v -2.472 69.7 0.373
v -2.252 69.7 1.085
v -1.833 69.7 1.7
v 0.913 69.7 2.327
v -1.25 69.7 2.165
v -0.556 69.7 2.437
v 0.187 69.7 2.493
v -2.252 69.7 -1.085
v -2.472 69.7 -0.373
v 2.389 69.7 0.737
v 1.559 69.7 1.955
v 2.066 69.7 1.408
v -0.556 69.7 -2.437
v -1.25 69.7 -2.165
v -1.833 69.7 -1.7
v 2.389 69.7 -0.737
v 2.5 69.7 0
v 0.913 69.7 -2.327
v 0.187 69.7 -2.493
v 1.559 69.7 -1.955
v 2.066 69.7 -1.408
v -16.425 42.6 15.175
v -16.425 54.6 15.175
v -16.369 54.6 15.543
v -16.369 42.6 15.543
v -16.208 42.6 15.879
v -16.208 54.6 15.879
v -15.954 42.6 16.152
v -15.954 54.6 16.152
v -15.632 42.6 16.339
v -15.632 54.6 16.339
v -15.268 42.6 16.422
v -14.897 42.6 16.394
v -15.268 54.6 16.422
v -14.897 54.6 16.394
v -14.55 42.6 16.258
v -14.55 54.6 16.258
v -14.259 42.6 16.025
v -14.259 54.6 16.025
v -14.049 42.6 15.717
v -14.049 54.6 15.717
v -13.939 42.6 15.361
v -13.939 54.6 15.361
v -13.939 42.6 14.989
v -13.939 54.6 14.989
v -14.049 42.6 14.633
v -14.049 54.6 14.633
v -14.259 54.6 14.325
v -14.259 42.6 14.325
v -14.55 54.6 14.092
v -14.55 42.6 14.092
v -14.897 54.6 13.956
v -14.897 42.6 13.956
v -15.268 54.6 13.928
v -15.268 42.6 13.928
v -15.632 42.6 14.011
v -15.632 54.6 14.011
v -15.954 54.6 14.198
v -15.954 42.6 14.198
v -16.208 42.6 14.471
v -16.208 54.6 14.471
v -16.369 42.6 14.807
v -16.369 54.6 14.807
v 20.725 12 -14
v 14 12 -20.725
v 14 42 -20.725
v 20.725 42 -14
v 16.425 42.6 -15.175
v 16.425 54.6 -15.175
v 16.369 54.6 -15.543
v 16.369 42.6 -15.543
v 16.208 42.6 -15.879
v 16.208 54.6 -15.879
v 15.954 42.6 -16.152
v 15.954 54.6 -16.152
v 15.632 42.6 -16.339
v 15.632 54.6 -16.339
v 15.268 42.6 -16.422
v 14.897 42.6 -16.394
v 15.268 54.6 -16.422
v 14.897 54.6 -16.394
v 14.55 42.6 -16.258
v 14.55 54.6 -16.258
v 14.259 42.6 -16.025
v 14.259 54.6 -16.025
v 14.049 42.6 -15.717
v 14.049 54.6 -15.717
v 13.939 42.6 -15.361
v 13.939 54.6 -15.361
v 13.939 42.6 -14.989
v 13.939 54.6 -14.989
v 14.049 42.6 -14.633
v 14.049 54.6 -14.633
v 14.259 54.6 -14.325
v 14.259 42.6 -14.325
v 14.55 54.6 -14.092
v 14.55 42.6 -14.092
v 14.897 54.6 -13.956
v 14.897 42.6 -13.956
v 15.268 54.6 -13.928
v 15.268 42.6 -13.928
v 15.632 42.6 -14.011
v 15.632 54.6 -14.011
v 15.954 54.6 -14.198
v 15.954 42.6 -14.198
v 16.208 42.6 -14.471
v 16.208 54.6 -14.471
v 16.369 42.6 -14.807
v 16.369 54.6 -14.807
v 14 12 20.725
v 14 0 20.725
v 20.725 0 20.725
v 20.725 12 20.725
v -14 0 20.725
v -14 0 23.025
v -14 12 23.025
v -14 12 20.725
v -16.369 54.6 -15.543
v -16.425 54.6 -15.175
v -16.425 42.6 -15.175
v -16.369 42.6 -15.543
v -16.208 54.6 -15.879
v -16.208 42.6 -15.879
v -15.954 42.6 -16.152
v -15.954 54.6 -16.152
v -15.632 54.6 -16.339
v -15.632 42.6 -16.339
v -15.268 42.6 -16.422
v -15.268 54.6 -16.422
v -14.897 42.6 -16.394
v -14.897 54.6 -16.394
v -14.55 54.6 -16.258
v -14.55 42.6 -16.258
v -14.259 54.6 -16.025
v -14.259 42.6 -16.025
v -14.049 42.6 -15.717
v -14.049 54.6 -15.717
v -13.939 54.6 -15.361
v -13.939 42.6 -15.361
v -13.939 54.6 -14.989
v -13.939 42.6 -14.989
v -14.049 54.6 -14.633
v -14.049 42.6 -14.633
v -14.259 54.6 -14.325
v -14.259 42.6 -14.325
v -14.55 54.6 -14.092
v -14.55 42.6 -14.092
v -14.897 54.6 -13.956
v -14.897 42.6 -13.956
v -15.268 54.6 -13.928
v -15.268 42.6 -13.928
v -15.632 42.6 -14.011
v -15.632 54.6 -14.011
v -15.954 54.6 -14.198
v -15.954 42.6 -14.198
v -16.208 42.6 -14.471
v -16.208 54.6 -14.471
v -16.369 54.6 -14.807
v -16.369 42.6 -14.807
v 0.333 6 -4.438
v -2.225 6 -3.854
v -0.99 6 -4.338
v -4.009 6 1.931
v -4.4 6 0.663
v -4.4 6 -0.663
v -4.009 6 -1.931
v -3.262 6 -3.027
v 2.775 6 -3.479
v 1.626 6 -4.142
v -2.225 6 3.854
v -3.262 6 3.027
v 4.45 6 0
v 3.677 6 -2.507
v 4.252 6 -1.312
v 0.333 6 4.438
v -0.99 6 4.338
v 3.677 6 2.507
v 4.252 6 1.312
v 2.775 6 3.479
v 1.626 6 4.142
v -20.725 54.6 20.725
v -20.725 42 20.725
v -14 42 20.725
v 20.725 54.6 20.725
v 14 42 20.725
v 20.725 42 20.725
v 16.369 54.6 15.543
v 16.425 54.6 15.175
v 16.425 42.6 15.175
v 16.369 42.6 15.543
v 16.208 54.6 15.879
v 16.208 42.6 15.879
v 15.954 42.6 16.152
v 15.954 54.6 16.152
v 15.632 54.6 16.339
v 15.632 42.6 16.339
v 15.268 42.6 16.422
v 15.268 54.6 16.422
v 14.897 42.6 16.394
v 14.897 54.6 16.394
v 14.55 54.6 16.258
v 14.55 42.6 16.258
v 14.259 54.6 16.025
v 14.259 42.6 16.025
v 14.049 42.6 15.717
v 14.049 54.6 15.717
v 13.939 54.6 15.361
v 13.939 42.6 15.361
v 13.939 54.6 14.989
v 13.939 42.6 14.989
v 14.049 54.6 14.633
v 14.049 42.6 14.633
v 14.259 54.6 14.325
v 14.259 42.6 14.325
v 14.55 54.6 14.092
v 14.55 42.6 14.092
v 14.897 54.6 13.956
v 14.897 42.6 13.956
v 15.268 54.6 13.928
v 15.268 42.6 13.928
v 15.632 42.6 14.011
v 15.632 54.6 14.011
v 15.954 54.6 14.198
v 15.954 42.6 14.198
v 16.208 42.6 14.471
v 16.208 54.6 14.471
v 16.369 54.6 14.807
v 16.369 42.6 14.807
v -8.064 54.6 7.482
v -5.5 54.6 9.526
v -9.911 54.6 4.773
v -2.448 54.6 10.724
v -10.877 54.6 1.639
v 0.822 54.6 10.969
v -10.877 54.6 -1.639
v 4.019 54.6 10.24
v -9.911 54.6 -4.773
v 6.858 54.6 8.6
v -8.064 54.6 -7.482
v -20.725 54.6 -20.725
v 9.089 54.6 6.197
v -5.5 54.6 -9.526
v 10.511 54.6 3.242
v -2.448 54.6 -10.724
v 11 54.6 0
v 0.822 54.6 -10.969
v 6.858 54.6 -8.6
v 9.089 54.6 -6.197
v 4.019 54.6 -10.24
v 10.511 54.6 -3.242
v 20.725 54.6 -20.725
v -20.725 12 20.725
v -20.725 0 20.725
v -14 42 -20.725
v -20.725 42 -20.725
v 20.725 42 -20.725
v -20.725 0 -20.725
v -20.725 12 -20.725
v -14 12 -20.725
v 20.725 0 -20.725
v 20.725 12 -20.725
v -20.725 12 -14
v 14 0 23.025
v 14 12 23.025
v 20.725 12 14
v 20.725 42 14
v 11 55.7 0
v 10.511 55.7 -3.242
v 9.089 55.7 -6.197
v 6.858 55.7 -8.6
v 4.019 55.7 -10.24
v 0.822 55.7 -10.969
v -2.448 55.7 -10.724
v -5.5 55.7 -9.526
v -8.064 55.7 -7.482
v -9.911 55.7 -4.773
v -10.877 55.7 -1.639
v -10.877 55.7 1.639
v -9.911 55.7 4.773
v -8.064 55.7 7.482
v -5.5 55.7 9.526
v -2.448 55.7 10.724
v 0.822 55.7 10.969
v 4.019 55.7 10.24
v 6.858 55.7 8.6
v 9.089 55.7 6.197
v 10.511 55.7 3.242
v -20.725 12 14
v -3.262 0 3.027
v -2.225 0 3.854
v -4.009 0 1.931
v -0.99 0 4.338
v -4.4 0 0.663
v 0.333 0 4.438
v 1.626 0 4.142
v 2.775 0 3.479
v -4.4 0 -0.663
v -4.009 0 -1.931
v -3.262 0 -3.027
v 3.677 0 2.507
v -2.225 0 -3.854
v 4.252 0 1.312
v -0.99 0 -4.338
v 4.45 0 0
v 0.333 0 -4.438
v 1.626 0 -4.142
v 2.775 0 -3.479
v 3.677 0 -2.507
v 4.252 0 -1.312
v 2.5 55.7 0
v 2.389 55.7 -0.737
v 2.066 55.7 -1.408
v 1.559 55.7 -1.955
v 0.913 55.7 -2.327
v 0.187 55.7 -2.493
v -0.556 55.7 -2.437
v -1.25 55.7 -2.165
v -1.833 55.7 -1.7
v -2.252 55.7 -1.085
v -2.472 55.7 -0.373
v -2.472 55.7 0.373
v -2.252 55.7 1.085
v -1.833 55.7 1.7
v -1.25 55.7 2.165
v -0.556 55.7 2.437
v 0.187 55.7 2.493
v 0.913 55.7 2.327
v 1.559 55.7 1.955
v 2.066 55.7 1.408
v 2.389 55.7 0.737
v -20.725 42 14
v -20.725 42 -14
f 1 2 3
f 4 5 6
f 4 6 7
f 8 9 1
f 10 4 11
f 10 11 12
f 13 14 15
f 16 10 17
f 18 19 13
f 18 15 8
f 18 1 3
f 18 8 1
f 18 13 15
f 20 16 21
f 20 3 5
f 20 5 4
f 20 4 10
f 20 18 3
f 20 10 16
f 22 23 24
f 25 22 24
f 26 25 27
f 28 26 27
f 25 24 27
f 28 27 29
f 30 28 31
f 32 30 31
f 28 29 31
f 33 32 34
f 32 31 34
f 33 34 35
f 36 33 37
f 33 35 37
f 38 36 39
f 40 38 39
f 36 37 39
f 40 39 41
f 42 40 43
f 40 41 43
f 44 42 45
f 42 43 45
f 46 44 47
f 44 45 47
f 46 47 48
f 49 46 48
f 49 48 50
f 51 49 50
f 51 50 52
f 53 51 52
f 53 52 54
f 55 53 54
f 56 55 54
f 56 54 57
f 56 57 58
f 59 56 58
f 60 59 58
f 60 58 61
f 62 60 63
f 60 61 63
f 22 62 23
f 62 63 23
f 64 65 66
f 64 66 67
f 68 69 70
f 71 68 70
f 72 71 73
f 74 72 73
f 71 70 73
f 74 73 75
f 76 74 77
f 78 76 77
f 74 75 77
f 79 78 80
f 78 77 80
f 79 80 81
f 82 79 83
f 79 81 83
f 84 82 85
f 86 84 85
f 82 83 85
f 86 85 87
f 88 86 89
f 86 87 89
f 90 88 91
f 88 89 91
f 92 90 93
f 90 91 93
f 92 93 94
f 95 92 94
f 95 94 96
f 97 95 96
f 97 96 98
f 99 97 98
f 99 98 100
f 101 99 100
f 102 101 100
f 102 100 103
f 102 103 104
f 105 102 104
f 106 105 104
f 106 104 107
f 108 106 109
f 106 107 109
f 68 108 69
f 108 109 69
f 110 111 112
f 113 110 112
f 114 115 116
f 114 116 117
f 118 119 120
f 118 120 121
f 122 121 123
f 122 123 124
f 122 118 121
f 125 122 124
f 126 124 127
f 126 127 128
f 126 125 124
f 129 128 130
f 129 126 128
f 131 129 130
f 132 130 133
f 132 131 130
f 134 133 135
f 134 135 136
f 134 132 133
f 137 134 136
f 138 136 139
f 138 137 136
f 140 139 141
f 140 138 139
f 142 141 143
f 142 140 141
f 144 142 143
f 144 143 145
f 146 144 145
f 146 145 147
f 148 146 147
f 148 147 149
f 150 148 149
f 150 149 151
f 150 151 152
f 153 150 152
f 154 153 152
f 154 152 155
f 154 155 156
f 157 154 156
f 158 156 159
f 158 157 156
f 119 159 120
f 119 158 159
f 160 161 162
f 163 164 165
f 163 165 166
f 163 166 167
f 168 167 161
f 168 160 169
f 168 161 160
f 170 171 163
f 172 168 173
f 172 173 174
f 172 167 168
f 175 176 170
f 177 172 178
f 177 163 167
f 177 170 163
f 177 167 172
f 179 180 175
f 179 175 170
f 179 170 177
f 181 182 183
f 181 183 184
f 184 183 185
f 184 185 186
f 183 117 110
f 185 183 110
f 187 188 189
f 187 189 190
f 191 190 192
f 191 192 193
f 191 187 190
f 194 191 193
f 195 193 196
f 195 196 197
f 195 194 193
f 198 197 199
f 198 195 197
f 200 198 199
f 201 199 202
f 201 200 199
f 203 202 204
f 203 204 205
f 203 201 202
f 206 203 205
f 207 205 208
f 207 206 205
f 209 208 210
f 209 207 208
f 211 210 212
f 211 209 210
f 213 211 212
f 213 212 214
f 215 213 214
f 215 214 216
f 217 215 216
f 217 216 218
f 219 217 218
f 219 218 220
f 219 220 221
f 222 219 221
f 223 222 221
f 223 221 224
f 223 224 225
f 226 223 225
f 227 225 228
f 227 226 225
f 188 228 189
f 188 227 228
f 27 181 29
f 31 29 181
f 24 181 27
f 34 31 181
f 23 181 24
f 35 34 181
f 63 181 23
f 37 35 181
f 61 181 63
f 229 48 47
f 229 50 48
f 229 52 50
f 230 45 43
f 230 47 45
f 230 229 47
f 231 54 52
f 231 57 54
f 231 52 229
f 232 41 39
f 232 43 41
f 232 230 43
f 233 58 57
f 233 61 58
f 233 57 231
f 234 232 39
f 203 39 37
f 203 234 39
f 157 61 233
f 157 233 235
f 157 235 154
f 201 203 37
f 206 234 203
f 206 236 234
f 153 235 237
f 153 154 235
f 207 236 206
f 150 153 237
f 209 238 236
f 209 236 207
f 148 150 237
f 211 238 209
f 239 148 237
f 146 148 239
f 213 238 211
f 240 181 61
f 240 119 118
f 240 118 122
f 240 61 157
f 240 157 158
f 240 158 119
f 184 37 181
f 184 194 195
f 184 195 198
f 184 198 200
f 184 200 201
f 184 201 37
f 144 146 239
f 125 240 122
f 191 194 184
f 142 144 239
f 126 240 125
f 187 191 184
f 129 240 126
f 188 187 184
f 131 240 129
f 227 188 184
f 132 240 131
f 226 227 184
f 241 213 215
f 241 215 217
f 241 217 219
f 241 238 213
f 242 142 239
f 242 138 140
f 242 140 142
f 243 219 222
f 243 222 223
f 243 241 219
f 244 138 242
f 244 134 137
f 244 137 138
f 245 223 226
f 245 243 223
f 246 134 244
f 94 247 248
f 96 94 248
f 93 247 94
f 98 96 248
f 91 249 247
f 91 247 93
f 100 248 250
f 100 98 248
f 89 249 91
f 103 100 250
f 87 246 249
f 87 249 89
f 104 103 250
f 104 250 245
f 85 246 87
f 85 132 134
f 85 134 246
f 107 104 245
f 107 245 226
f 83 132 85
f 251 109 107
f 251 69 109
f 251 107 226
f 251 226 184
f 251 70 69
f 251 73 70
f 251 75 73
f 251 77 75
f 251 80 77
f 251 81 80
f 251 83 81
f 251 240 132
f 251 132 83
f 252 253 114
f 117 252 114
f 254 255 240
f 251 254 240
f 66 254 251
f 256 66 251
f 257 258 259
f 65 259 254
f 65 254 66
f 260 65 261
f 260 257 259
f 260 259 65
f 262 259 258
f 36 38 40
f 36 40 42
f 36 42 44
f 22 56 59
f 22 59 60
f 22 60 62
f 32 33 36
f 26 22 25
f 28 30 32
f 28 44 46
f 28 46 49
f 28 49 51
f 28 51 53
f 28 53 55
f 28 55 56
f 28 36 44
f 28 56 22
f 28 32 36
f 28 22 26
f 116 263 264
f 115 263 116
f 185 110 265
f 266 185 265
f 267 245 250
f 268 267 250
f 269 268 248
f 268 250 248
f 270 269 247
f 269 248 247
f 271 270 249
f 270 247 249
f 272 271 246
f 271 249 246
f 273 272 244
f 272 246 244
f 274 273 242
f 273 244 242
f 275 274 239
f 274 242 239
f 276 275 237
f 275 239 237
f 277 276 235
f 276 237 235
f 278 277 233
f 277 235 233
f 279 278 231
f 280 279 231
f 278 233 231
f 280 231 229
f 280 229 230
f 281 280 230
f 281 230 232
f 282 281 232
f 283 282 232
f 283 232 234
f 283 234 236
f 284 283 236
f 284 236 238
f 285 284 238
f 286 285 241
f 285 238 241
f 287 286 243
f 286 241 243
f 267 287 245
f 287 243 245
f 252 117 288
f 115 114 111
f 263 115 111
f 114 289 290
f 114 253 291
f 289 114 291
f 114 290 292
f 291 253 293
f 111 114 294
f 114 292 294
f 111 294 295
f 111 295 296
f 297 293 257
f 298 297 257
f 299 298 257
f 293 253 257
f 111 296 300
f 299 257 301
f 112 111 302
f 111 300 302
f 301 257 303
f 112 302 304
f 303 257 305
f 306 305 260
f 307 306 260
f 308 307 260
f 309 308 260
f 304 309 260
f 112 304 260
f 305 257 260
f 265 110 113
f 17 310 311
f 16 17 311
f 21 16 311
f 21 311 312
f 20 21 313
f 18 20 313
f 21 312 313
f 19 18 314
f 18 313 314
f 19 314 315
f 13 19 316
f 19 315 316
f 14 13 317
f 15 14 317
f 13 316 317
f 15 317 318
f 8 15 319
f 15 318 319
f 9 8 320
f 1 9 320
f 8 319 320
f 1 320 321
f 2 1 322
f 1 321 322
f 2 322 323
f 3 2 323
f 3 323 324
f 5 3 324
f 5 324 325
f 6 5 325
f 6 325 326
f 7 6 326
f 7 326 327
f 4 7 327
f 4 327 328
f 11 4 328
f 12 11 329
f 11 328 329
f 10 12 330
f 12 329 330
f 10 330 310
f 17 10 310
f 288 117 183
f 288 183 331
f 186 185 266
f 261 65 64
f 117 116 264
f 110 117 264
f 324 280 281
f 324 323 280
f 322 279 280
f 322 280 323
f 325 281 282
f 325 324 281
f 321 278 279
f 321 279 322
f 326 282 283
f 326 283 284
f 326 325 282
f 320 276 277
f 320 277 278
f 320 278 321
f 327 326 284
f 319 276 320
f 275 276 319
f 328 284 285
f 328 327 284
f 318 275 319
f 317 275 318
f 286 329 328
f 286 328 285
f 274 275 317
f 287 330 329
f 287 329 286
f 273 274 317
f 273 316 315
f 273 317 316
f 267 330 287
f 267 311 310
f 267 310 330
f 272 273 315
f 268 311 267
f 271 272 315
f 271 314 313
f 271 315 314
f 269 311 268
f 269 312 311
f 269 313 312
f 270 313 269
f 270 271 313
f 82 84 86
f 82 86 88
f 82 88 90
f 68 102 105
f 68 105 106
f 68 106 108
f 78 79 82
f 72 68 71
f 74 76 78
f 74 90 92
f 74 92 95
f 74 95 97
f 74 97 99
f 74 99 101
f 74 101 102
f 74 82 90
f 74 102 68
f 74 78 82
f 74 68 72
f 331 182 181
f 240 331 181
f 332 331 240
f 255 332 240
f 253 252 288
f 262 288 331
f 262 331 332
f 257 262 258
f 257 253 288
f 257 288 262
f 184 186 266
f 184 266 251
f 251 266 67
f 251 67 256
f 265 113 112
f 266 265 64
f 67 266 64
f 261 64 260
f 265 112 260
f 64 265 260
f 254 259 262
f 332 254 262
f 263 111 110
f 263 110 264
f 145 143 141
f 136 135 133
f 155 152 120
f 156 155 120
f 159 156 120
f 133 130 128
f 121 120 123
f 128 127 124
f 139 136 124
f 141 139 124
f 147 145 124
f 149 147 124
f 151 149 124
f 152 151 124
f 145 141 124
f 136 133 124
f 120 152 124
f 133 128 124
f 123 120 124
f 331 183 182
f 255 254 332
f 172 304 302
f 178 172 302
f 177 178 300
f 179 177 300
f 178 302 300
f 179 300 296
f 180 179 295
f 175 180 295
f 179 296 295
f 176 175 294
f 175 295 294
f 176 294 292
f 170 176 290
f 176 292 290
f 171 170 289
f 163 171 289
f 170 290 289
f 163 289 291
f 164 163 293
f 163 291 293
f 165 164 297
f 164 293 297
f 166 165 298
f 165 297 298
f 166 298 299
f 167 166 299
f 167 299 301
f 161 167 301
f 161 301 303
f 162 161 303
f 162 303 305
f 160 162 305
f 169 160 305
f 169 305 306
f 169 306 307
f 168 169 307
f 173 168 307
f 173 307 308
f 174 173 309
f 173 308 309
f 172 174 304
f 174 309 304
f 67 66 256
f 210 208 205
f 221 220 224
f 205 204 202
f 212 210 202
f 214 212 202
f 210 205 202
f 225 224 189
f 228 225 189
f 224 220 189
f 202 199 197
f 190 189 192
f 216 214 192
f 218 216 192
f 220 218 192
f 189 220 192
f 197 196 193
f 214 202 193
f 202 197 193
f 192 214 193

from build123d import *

# Parameters (mm, degrees)
SKETCH1_W               = 41.45
SKETCH1_H               = 41.45
BOSS_EXTRUDE1_DEPTH     = 54.6
SKETCH2_R               = 11
BOSS_EXTRUDE2_DEPTH     = 1.1
SKETCH3_R               = 2.5
BOSS_EXTRUDE3_DEPTH     = 14
BOSS_EXTRUDE4_DEPTH     = 12
SKETCH5_R               = 1.25
CUT_EXTRUDE1_DEPTH      = 12
MIRROR2_COPY_1_SKETCH_R = 1.25
MIRROR2_COPY_1_DEPTH    = 12
CUT_EXTRUDE2_DEPTH      = 30
MIRROR4_COPY_1_DEPTH    = 30
SKETCH10_R              = 4.45
CUT_EXTRUDE3_DEPTH      = 6


with BuildPart() as part:
    # Sketch1 → Boss-Extrude1 (new body)
    with BuildSketch(Plane(origin=(0, 0, 0), x_dir=(1, 0, 0), z_dir=(0, 1, 0))):
        Rectangle(SKETCH1_W, SKETCH1_H)
    extrude(amount=BOSS_EXTRUDE1_DEPTH)

    # Sketch2 → Boss-Extrude2 (add)
    with BuildSketch(Plane(origin=(0, 54.6, 0), x_dir=(1, 0, 0), z_dir=(0, 1, 0))):
        Circle(SKETCH2_R)
    extrude(amount=BOSS_EXTRUDE2_DEPTH)

    # Sketch3 → Boss-Extrude3 (add)
    with BuildSketch(Plane(origin=(0, 55.7, 0), x_dir=(1, 0, 0), z_dir=(0, 1, 0))):
        Circle(SKETCH3_R)
    extrude(amount=BOSS_EXTRUDE3_DEPTH)

    # Sketch4 → Boss-Extrude4 (add)
    with BuildSketch(Plane.XZ):
        Polygon((0, 20.725), (14, 20.725), (14, 23.025), (-14, 23.025), (-14, 20.725), align=None)
    extrude(amount=-BOSS_EXTRUDE4_DEPTH)

    # Sketch5 → Cut-Extrude1 (cut)
    with BuildSketch(Plane(origin=(0, 54.6, 0), x_dir=(1, 0, 0), z_dir=(0, 1, 0))):
        with Locations((15.175, 15.175)):
            Circle(SKETCH5_R)
    cut_extrude1 = extrude(amount=-CUT_EXTRUDE1_DEPTH, mode=Mode.SUBTRACT)

    # Mirror1: Cut-Extrude1 across plane
    add(cut_extrude1.mirror(Plane.XY), mode=Mode.SUBTRACT)

    # Mirror2: Cut-Extrude1 across plane
    add(cut_extrude1.mirror(Plane(origin=(0, 0, 0), x_dir=(0, 0, 1), z_dir=(1, 0, 0))), mode=Mode.SUBTRACT)

    # Mirror2 copy 1 sketch → Mirror2 copy 1 (cut)
    with BuildSketch(Plane(origin=(0, 54.6, 0), x_dir=(-1, 0, 0), z_dir=(0, 1, 0))):
        with Locations((15.175, 15.175)):
            Circle(MIRROR2_COPY_1_SKETCH_R)
    extrude(amount=-MIRROR2_COPY_1_DEPTH, mode=Mode.SUBTRACT)

    # Sketch8 → Cut-Extrude2 (cut)
    with BuildSketch(Plane(origin=(0, 12, 0), x_dir=(1, 0, 0), z_dir=(0, 1, 0))):
        Polygon((-20.725, 14), (-20.725, 20.725), (-14, 20.725), align=None)
    cut_extrude2 = extrude(amount=CUT_EXTRUDE2_DEPTH, mode=Mode.SUBTRACT)

    # Mirror3: Cut-Extrude2 across plane
    add(cut_extrude2.mirror(Plane(origin=(0, 0, 0), x_dir=(0, 0, 1), z_dir=(1, 0, 0))), mode=Mode.SUBTRACT)

    # Mirror4: Cut-Extrude2 across plane
    add(cut_extrude2.mirror(Plane.XY), mode=Mode.SUBTRACT)

    # Mirror4 copy 1 sketch → Mirror4 copy 1 (cut)
    with BuildSketch(Plane(origin=(0, 12, 0), x_dir=(-1, 0, 0), z_dir=(0, 1, 0))):
        Polygon((-20.725, 14), (-20.725, 20.725), (-14, 20.725), align=None)
    extrude(amount=MIRROR4_COPY_1_DEPTH, mode=Mode.SUBTRACT)

    # Sketch10 → Cut-Extrude3 (cut)
    with BuildSketch(Plane.XZ):
        Circle(SKETCH10_R)
    extrude(amount=-CUT_EXTRUDE3_DEPTH, mode=Mode.SUBTRACT)


solid = part.part
